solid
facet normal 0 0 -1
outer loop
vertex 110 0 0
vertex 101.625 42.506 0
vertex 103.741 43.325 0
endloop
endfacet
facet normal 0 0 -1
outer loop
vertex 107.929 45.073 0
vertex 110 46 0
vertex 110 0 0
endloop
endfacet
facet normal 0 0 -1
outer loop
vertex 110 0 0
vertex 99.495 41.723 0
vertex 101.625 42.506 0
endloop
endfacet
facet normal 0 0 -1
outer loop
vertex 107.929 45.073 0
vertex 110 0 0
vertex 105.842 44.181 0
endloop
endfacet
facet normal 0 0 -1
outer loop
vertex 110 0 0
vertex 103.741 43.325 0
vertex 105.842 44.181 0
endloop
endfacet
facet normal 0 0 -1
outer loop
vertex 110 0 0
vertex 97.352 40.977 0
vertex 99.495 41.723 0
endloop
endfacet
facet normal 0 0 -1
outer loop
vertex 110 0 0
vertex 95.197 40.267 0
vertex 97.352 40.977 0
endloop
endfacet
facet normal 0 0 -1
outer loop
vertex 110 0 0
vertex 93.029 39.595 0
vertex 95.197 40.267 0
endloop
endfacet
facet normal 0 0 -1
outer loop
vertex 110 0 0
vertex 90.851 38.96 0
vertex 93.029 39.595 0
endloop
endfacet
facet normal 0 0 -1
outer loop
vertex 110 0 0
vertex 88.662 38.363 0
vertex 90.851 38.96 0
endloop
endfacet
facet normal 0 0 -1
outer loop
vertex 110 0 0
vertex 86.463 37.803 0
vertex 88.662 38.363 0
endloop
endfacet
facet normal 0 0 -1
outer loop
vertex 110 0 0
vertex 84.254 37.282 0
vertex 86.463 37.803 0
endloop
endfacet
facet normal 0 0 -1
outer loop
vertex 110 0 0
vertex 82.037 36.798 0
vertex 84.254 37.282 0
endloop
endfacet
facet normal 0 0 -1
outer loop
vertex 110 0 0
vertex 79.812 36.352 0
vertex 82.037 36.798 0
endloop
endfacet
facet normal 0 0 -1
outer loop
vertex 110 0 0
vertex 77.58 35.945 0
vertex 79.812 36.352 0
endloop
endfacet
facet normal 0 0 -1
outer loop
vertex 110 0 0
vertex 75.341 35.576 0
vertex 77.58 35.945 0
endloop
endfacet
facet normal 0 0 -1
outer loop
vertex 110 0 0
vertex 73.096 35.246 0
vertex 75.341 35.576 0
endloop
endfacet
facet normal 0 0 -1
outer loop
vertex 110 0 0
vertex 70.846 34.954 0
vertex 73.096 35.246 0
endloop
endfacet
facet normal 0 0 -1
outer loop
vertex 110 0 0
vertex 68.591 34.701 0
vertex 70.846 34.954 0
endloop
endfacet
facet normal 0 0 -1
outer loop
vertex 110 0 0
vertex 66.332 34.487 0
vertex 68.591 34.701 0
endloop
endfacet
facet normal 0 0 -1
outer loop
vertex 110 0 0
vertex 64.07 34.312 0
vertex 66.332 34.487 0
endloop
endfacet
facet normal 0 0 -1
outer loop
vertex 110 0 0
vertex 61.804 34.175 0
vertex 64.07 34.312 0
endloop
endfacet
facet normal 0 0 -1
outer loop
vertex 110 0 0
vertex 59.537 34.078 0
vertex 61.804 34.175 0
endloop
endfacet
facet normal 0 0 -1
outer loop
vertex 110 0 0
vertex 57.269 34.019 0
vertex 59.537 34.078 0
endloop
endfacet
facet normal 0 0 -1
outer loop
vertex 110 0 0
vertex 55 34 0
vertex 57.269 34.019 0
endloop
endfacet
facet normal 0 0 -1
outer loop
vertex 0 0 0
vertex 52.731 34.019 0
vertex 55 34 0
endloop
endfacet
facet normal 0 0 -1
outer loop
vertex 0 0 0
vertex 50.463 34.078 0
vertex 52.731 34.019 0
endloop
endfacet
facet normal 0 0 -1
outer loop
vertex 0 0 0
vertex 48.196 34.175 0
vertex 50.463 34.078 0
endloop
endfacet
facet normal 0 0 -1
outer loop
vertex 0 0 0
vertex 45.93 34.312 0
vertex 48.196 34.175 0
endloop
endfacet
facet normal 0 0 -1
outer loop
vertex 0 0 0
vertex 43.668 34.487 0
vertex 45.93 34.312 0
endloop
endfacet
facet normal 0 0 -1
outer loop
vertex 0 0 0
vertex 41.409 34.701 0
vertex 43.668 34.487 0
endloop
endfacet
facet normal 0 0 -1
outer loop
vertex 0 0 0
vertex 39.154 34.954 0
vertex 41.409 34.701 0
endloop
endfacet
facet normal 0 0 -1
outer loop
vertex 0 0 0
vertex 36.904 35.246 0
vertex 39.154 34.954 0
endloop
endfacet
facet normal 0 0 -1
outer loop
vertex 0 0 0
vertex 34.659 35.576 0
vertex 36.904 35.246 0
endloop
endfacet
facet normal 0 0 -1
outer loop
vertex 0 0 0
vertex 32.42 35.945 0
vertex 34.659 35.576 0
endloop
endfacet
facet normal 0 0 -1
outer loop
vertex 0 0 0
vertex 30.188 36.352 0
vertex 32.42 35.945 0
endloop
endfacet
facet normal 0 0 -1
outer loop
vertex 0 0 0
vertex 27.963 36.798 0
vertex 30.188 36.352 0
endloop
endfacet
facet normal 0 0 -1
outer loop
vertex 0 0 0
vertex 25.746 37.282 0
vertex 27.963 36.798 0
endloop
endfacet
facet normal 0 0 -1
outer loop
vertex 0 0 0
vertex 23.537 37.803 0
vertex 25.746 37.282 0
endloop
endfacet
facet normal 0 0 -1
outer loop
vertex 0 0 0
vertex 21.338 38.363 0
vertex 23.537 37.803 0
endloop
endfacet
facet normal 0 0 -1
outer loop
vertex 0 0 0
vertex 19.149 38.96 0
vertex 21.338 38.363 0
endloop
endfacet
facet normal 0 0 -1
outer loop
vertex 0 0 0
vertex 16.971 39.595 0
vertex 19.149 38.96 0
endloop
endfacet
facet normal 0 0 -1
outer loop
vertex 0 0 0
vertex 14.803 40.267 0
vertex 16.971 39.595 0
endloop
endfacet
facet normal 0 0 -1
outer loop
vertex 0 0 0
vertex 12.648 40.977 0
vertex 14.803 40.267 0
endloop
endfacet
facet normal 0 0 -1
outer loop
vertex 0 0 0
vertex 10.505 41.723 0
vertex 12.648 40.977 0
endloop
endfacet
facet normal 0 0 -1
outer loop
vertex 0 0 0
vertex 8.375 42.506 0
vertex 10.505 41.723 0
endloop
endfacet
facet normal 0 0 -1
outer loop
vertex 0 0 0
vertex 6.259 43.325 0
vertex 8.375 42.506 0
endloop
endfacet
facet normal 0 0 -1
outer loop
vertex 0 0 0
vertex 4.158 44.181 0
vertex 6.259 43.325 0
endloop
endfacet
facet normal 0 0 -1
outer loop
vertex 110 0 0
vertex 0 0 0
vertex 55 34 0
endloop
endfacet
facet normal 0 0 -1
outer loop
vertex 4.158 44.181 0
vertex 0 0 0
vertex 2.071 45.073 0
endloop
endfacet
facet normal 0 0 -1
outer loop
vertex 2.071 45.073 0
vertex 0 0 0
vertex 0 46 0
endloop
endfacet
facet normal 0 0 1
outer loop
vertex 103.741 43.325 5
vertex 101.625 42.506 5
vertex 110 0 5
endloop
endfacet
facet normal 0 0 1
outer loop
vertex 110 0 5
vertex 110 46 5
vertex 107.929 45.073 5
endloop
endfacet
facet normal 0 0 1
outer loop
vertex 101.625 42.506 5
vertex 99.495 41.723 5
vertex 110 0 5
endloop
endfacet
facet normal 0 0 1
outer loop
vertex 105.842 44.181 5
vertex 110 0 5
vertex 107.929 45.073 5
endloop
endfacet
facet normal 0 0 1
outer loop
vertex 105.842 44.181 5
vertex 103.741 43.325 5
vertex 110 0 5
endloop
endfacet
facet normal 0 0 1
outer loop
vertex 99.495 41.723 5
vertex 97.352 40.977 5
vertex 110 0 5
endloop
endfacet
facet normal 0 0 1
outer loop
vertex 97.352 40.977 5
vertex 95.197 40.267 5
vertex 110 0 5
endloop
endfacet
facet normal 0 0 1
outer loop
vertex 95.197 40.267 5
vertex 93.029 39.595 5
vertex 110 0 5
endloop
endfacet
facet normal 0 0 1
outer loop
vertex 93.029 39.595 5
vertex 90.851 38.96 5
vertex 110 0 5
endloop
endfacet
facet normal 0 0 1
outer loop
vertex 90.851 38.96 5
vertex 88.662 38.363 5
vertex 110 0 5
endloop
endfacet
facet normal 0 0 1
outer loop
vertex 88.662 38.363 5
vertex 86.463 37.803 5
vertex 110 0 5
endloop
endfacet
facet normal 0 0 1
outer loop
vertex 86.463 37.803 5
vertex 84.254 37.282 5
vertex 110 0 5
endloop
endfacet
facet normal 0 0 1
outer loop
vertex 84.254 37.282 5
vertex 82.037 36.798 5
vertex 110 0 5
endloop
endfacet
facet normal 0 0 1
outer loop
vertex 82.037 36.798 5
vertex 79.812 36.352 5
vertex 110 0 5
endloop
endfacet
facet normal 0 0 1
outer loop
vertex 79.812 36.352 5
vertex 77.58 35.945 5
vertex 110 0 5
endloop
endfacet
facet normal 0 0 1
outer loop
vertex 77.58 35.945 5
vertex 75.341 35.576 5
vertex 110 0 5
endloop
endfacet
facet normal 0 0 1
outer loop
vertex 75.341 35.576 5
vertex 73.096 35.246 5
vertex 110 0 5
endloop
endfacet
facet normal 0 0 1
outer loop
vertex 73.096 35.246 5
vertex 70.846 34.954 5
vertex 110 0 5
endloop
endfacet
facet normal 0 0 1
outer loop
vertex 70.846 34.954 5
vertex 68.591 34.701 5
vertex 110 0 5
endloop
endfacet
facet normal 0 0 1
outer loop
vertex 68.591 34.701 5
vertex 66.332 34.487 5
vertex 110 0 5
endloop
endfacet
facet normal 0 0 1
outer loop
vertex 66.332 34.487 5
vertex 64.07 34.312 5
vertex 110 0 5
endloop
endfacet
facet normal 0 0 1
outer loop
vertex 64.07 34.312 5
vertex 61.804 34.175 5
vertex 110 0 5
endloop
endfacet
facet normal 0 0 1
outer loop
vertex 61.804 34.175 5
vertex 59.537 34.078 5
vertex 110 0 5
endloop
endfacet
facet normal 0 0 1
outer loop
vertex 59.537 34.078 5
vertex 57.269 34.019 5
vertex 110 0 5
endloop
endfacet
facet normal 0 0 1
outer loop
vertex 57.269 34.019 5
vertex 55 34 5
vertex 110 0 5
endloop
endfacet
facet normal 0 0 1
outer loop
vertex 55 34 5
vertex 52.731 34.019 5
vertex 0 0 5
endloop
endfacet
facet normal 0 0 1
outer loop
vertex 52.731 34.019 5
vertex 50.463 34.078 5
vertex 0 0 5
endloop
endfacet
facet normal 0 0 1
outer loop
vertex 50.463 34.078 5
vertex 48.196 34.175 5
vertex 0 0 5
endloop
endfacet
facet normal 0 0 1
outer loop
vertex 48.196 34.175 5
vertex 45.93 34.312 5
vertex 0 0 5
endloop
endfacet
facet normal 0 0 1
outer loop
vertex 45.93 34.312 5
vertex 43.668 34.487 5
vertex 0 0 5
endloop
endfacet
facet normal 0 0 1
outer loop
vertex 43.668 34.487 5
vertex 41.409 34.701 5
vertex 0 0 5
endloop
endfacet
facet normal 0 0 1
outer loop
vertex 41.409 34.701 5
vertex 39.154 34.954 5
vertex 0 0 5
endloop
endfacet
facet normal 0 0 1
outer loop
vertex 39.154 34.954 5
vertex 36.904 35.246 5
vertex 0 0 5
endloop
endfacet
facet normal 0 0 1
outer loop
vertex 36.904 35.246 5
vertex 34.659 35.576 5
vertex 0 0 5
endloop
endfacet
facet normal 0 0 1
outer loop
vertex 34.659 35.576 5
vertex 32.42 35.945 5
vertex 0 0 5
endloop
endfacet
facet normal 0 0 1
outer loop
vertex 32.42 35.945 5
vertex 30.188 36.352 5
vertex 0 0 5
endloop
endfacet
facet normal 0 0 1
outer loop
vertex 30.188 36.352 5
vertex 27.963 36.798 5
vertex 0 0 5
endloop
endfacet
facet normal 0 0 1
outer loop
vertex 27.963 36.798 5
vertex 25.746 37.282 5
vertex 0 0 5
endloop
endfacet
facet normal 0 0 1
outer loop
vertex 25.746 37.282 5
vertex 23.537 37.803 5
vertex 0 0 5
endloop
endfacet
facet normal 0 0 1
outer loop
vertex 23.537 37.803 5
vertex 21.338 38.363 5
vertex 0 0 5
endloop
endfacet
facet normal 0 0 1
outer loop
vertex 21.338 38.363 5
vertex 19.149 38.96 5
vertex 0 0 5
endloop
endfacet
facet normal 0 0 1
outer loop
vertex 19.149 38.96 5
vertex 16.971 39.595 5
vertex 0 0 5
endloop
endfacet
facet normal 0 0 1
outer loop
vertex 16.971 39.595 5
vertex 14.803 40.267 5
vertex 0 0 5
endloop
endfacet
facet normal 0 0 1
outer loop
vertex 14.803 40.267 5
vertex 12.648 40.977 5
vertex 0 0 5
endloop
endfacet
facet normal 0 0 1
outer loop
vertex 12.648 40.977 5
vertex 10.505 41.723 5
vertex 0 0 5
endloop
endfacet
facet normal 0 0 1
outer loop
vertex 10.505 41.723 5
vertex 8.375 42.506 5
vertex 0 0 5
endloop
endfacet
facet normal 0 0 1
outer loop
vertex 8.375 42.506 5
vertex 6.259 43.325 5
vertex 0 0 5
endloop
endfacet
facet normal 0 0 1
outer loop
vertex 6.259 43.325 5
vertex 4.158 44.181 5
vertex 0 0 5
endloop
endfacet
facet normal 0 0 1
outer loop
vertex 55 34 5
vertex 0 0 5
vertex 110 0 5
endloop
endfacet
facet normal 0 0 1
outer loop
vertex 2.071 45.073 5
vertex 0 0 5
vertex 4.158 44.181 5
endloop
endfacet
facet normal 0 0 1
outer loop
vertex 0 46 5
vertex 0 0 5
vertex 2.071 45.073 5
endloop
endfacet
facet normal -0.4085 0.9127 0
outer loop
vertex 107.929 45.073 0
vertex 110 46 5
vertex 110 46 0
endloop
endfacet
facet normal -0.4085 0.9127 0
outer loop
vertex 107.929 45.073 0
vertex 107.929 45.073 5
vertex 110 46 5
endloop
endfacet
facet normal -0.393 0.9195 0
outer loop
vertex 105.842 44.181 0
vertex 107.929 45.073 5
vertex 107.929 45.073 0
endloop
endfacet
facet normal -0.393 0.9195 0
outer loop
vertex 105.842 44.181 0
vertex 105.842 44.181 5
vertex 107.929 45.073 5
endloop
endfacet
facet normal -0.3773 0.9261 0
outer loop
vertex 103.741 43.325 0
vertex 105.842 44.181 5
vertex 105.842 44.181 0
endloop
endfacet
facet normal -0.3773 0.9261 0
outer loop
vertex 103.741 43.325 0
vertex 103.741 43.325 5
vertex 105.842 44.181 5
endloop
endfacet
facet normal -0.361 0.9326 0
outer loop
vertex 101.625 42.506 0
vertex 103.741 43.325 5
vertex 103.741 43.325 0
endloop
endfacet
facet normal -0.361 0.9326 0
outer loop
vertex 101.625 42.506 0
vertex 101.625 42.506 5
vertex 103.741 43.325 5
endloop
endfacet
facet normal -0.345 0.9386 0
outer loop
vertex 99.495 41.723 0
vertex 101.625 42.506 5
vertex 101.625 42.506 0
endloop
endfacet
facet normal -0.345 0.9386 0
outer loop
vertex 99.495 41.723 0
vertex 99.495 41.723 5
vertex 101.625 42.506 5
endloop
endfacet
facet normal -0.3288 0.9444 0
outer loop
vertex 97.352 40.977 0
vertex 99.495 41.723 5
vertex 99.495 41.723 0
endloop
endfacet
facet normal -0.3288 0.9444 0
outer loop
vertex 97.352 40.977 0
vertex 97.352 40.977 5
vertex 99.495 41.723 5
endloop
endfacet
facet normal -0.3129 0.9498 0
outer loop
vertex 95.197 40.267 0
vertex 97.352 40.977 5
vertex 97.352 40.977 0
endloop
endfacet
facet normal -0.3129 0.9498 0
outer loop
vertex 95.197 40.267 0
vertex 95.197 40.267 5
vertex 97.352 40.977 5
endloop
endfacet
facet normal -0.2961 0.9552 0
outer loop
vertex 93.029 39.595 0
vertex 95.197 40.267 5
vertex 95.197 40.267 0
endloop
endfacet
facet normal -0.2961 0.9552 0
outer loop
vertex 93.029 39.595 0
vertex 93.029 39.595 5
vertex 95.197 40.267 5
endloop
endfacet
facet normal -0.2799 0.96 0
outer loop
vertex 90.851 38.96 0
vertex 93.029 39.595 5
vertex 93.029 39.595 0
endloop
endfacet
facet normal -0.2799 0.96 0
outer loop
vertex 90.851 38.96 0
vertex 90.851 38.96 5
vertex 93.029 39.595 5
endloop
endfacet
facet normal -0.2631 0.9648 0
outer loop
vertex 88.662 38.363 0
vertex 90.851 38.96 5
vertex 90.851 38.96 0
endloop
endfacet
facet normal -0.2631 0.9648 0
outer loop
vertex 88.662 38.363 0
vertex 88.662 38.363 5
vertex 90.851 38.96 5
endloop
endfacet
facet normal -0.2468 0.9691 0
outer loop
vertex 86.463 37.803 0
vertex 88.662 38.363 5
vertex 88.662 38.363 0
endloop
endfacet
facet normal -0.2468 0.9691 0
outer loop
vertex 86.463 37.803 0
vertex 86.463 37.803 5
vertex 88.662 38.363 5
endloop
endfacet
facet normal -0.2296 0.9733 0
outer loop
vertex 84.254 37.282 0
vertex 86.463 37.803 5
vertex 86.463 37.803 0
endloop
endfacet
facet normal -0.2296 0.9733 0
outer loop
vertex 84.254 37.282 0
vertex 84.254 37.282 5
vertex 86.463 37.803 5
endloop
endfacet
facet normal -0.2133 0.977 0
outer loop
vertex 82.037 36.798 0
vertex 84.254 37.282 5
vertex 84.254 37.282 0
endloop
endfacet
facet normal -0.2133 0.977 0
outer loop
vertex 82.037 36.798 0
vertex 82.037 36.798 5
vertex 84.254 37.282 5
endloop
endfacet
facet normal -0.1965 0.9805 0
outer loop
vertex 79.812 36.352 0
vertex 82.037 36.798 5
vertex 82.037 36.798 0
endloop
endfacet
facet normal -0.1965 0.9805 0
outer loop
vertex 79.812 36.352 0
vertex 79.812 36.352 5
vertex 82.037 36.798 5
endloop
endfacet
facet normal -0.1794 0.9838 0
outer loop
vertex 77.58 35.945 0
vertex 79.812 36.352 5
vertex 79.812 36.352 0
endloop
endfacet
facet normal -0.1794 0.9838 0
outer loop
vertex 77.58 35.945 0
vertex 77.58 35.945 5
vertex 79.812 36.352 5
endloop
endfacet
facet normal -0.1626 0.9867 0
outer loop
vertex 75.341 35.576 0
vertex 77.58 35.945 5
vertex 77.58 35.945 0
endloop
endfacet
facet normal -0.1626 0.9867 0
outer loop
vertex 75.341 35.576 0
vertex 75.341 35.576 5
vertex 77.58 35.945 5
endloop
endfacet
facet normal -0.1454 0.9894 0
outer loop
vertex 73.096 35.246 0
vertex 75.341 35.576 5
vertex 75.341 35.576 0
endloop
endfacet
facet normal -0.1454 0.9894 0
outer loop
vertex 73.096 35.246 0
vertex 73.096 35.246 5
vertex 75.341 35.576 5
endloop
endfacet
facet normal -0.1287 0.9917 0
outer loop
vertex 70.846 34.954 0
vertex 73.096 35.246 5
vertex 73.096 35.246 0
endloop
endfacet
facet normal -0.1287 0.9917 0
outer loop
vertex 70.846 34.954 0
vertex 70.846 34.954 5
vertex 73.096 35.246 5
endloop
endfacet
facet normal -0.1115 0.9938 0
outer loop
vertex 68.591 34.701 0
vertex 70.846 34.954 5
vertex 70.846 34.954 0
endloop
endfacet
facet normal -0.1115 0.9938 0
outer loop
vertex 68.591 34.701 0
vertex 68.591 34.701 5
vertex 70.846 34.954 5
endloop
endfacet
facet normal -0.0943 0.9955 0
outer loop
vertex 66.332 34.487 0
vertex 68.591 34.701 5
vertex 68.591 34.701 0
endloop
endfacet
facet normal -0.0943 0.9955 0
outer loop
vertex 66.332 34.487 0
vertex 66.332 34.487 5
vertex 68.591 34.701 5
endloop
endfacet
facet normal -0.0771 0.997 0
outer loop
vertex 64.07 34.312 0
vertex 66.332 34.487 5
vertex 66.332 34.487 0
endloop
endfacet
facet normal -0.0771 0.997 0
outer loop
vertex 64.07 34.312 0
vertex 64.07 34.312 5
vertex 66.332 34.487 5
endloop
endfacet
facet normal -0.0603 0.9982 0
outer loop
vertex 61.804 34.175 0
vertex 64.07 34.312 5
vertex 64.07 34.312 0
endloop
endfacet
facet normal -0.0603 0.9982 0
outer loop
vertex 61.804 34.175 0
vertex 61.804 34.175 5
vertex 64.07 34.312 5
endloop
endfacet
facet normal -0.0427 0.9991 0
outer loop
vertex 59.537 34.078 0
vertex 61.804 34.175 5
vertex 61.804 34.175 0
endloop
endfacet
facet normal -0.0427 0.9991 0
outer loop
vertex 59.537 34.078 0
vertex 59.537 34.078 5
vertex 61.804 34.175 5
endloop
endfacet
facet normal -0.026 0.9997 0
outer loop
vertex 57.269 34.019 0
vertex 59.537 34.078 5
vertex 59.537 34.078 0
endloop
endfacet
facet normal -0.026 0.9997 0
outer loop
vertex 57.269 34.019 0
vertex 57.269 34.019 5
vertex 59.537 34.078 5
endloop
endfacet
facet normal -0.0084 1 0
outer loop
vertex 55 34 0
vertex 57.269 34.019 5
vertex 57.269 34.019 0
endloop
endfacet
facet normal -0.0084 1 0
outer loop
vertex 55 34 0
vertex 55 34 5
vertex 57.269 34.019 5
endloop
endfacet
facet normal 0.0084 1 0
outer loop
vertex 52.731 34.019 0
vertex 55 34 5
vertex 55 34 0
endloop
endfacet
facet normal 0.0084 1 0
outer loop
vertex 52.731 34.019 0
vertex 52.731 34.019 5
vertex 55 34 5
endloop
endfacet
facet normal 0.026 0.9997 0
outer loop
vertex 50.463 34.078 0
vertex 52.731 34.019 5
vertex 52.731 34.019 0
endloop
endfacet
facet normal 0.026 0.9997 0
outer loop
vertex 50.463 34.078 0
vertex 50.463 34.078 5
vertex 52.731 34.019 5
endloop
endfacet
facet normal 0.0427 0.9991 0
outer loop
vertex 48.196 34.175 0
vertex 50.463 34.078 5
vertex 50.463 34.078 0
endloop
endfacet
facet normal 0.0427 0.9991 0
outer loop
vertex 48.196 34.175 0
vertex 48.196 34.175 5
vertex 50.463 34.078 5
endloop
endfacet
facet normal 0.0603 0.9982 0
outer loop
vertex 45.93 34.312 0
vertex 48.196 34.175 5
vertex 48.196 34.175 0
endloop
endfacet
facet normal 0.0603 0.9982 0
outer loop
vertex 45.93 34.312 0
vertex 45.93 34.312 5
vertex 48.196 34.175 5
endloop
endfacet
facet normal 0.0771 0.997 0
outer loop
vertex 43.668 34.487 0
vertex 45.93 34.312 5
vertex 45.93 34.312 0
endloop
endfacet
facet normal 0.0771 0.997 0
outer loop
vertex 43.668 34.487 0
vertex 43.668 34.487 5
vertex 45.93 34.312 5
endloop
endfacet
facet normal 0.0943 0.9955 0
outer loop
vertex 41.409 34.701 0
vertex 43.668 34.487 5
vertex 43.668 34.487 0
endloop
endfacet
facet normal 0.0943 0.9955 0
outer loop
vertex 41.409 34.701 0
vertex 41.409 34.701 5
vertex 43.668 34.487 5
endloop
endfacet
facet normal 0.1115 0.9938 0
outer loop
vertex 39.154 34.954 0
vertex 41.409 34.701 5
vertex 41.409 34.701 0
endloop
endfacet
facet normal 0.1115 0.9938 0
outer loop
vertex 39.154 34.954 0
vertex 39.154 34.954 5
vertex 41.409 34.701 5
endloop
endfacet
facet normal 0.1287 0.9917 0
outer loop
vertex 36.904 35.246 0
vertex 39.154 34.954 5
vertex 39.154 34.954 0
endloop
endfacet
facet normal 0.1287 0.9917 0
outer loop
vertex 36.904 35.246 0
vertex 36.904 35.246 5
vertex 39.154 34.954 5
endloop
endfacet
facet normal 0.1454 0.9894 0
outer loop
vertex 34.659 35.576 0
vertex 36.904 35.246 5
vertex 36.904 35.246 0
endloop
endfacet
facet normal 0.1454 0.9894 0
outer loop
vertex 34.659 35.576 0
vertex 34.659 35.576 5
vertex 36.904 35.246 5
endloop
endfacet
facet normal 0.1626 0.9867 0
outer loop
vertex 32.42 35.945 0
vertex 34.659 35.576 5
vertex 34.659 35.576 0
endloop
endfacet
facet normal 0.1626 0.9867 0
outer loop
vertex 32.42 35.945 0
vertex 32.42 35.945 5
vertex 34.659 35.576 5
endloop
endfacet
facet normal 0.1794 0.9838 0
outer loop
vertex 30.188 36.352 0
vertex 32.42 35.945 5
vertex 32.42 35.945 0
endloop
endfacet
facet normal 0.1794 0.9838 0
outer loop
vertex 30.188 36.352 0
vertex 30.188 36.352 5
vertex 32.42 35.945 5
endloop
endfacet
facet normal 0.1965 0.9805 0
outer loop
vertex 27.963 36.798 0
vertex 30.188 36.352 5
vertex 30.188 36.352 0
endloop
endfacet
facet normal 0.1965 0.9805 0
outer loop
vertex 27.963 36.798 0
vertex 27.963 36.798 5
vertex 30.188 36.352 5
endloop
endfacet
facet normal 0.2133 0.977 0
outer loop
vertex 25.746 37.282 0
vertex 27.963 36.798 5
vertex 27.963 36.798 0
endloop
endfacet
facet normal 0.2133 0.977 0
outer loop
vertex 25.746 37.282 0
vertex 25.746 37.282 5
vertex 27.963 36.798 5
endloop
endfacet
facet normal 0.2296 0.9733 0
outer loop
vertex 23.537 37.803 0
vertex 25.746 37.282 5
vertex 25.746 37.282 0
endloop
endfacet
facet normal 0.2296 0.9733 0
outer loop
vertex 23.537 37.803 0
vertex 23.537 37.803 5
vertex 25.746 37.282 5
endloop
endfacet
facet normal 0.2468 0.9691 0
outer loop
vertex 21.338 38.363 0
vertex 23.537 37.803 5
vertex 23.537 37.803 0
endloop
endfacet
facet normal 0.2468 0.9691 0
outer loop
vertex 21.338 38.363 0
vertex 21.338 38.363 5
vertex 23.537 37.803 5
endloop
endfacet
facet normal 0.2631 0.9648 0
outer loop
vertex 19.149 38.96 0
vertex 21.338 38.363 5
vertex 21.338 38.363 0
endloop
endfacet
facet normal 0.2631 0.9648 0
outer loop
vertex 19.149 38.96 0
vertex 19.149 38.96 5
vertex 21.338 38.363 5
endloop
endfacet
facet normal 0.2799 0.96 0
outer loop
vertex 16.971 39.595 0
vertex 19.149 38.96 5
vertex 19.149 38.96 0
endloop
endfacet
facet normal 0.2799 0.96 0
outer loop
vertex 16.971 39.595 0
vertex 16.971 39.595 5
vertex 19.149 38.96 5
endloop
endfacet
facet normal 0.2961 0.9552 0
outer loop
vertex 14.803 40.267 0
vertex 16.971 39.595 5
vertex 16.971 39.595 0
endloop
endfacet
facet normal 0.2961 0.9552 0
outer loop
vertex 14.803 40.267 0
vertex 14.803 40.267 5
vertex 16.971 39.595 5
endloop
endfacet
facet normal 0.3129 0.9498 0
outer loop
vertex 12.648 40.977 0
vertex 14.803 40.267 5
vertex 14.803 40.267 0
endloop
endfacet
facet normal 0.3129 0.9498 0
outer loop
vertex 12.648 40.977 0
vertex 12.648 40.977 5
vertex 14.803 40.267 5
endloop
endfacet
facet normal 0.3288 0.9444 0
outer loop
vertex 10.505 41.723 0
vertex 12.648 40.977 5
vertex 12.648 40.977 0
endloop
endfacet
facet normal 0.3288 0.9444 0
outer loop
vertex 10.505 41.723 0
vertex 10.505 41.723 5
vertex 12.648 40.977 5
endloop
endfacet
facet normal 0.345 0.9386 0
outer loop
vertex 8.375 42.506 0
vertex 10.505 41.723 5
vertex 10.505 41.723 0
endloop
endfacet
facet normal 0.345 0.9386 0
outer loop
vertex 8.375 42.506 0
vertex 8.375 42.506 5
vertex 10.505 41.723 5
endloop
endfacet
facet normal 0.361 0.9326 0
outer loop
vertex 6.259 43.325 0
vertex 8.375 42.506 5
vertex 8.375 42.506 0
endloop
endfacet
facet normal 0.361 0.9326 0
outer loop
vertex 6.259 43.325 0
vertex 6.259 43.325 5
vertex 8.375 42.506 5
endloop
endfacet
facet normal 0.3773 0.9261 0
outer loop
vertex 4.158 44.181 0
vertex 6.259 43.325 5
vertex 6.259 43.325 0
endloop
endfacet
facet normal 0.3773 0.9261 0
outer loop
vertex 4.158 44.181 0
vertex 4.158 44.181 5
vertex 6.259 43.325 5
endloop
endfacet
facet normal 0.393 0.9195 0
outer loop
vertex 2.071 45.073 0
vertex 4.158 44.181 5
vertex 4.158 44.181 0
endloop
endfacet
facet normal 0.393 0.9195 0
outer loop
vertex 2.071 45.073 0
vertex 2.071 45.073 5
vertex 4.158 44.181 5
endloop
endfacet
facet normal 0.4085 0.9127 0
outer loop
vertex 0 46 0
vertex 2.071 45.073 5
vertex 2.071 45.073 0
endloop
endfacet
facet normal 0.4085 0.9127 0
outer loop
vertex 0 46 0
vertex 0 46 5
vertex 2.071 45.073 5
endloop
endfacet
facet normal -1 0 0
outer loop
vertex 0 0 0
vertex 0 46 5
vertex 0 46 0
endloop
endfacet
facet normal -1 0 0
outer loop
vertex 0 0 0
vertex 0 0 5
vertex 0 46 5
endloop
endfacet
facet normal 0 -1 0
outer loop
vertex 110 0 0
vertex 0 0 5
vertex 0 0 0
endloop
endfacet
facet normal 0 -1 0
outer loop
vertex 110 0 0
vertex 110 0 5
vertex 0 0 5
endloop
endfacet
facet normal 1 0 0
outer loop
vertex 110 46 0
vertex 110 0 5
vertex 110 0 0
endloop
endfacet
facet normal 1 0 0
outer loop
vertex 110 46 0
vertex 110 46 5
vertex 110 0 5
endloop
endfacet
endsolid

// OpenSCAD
$fn = 32;

// ----------------------------------------------------------------------
// Arc profile plate: notch, 53 points
// ----------------------------------------------------------------------

// --- parameters (mm) ---
bar_l = 110;              // bar length, X
bar_w = 46;               // bar width, Y
notch_depth = 12;         // depth of the arc notch at mid-span
arc_r = 132.04;           // radius of the notch arc
arc_angle = 49.23;        // notch arc angle, degrees
arc_step = 1;             // sampling step of the notch arc, degrees
plate_t = 5;              // plate thickness, Z

profile = [[0, 0], [110, 0], [110, 46], [107.929, 45.073], [105.842, 44.181], [103.741, 43.325], [101.625, 42.506], [99.495, 41.723], [97.352, 40.977], [95.197, 40.267], [93.029, 39.595], [90.851, 38.96], [88.662, 38.363], [86.463, 37.803], [84.254, 37.282], [82.037, 36.798], [79.812, 36.352], [77.58, 35.945], [75.341, 35.576], [73.096, 35.246], [70.846, 34.954], [68.591, 34.701], [66.332, 34.487], [64.07, 34.312], [61.804, 34.175], [59.537, 34.078], [57.269, 34.019], [55, 34], [52.731, 34.019], [50.463, 34.078], [48.196, 34.175], [45.93, 34.312], [43.668, 34.487], [41.409, 34.701], [39.154, 34.954], [36.904, 35.246], [34.659, 35.576], [32.42, 35.945], [30.188, 36.352], [27.963, 36.798], [25.746, 37.282], [23.537, 37.803], [21.338, 38.363], [19.149, 38.96], [16.971, 39.595], [14.803, 40.267], [12.648, 40.977], [10.505, 41.723], [8.375, 42.506], [6.259, 43.325], [4.158, 44.181], [2.071, 45.073], [0, 46]];  // primary outline, 53 points, counter clockwise

// --- the one profile operation ---
linear_extrude(height = plate_t) polygon(points = profile);
